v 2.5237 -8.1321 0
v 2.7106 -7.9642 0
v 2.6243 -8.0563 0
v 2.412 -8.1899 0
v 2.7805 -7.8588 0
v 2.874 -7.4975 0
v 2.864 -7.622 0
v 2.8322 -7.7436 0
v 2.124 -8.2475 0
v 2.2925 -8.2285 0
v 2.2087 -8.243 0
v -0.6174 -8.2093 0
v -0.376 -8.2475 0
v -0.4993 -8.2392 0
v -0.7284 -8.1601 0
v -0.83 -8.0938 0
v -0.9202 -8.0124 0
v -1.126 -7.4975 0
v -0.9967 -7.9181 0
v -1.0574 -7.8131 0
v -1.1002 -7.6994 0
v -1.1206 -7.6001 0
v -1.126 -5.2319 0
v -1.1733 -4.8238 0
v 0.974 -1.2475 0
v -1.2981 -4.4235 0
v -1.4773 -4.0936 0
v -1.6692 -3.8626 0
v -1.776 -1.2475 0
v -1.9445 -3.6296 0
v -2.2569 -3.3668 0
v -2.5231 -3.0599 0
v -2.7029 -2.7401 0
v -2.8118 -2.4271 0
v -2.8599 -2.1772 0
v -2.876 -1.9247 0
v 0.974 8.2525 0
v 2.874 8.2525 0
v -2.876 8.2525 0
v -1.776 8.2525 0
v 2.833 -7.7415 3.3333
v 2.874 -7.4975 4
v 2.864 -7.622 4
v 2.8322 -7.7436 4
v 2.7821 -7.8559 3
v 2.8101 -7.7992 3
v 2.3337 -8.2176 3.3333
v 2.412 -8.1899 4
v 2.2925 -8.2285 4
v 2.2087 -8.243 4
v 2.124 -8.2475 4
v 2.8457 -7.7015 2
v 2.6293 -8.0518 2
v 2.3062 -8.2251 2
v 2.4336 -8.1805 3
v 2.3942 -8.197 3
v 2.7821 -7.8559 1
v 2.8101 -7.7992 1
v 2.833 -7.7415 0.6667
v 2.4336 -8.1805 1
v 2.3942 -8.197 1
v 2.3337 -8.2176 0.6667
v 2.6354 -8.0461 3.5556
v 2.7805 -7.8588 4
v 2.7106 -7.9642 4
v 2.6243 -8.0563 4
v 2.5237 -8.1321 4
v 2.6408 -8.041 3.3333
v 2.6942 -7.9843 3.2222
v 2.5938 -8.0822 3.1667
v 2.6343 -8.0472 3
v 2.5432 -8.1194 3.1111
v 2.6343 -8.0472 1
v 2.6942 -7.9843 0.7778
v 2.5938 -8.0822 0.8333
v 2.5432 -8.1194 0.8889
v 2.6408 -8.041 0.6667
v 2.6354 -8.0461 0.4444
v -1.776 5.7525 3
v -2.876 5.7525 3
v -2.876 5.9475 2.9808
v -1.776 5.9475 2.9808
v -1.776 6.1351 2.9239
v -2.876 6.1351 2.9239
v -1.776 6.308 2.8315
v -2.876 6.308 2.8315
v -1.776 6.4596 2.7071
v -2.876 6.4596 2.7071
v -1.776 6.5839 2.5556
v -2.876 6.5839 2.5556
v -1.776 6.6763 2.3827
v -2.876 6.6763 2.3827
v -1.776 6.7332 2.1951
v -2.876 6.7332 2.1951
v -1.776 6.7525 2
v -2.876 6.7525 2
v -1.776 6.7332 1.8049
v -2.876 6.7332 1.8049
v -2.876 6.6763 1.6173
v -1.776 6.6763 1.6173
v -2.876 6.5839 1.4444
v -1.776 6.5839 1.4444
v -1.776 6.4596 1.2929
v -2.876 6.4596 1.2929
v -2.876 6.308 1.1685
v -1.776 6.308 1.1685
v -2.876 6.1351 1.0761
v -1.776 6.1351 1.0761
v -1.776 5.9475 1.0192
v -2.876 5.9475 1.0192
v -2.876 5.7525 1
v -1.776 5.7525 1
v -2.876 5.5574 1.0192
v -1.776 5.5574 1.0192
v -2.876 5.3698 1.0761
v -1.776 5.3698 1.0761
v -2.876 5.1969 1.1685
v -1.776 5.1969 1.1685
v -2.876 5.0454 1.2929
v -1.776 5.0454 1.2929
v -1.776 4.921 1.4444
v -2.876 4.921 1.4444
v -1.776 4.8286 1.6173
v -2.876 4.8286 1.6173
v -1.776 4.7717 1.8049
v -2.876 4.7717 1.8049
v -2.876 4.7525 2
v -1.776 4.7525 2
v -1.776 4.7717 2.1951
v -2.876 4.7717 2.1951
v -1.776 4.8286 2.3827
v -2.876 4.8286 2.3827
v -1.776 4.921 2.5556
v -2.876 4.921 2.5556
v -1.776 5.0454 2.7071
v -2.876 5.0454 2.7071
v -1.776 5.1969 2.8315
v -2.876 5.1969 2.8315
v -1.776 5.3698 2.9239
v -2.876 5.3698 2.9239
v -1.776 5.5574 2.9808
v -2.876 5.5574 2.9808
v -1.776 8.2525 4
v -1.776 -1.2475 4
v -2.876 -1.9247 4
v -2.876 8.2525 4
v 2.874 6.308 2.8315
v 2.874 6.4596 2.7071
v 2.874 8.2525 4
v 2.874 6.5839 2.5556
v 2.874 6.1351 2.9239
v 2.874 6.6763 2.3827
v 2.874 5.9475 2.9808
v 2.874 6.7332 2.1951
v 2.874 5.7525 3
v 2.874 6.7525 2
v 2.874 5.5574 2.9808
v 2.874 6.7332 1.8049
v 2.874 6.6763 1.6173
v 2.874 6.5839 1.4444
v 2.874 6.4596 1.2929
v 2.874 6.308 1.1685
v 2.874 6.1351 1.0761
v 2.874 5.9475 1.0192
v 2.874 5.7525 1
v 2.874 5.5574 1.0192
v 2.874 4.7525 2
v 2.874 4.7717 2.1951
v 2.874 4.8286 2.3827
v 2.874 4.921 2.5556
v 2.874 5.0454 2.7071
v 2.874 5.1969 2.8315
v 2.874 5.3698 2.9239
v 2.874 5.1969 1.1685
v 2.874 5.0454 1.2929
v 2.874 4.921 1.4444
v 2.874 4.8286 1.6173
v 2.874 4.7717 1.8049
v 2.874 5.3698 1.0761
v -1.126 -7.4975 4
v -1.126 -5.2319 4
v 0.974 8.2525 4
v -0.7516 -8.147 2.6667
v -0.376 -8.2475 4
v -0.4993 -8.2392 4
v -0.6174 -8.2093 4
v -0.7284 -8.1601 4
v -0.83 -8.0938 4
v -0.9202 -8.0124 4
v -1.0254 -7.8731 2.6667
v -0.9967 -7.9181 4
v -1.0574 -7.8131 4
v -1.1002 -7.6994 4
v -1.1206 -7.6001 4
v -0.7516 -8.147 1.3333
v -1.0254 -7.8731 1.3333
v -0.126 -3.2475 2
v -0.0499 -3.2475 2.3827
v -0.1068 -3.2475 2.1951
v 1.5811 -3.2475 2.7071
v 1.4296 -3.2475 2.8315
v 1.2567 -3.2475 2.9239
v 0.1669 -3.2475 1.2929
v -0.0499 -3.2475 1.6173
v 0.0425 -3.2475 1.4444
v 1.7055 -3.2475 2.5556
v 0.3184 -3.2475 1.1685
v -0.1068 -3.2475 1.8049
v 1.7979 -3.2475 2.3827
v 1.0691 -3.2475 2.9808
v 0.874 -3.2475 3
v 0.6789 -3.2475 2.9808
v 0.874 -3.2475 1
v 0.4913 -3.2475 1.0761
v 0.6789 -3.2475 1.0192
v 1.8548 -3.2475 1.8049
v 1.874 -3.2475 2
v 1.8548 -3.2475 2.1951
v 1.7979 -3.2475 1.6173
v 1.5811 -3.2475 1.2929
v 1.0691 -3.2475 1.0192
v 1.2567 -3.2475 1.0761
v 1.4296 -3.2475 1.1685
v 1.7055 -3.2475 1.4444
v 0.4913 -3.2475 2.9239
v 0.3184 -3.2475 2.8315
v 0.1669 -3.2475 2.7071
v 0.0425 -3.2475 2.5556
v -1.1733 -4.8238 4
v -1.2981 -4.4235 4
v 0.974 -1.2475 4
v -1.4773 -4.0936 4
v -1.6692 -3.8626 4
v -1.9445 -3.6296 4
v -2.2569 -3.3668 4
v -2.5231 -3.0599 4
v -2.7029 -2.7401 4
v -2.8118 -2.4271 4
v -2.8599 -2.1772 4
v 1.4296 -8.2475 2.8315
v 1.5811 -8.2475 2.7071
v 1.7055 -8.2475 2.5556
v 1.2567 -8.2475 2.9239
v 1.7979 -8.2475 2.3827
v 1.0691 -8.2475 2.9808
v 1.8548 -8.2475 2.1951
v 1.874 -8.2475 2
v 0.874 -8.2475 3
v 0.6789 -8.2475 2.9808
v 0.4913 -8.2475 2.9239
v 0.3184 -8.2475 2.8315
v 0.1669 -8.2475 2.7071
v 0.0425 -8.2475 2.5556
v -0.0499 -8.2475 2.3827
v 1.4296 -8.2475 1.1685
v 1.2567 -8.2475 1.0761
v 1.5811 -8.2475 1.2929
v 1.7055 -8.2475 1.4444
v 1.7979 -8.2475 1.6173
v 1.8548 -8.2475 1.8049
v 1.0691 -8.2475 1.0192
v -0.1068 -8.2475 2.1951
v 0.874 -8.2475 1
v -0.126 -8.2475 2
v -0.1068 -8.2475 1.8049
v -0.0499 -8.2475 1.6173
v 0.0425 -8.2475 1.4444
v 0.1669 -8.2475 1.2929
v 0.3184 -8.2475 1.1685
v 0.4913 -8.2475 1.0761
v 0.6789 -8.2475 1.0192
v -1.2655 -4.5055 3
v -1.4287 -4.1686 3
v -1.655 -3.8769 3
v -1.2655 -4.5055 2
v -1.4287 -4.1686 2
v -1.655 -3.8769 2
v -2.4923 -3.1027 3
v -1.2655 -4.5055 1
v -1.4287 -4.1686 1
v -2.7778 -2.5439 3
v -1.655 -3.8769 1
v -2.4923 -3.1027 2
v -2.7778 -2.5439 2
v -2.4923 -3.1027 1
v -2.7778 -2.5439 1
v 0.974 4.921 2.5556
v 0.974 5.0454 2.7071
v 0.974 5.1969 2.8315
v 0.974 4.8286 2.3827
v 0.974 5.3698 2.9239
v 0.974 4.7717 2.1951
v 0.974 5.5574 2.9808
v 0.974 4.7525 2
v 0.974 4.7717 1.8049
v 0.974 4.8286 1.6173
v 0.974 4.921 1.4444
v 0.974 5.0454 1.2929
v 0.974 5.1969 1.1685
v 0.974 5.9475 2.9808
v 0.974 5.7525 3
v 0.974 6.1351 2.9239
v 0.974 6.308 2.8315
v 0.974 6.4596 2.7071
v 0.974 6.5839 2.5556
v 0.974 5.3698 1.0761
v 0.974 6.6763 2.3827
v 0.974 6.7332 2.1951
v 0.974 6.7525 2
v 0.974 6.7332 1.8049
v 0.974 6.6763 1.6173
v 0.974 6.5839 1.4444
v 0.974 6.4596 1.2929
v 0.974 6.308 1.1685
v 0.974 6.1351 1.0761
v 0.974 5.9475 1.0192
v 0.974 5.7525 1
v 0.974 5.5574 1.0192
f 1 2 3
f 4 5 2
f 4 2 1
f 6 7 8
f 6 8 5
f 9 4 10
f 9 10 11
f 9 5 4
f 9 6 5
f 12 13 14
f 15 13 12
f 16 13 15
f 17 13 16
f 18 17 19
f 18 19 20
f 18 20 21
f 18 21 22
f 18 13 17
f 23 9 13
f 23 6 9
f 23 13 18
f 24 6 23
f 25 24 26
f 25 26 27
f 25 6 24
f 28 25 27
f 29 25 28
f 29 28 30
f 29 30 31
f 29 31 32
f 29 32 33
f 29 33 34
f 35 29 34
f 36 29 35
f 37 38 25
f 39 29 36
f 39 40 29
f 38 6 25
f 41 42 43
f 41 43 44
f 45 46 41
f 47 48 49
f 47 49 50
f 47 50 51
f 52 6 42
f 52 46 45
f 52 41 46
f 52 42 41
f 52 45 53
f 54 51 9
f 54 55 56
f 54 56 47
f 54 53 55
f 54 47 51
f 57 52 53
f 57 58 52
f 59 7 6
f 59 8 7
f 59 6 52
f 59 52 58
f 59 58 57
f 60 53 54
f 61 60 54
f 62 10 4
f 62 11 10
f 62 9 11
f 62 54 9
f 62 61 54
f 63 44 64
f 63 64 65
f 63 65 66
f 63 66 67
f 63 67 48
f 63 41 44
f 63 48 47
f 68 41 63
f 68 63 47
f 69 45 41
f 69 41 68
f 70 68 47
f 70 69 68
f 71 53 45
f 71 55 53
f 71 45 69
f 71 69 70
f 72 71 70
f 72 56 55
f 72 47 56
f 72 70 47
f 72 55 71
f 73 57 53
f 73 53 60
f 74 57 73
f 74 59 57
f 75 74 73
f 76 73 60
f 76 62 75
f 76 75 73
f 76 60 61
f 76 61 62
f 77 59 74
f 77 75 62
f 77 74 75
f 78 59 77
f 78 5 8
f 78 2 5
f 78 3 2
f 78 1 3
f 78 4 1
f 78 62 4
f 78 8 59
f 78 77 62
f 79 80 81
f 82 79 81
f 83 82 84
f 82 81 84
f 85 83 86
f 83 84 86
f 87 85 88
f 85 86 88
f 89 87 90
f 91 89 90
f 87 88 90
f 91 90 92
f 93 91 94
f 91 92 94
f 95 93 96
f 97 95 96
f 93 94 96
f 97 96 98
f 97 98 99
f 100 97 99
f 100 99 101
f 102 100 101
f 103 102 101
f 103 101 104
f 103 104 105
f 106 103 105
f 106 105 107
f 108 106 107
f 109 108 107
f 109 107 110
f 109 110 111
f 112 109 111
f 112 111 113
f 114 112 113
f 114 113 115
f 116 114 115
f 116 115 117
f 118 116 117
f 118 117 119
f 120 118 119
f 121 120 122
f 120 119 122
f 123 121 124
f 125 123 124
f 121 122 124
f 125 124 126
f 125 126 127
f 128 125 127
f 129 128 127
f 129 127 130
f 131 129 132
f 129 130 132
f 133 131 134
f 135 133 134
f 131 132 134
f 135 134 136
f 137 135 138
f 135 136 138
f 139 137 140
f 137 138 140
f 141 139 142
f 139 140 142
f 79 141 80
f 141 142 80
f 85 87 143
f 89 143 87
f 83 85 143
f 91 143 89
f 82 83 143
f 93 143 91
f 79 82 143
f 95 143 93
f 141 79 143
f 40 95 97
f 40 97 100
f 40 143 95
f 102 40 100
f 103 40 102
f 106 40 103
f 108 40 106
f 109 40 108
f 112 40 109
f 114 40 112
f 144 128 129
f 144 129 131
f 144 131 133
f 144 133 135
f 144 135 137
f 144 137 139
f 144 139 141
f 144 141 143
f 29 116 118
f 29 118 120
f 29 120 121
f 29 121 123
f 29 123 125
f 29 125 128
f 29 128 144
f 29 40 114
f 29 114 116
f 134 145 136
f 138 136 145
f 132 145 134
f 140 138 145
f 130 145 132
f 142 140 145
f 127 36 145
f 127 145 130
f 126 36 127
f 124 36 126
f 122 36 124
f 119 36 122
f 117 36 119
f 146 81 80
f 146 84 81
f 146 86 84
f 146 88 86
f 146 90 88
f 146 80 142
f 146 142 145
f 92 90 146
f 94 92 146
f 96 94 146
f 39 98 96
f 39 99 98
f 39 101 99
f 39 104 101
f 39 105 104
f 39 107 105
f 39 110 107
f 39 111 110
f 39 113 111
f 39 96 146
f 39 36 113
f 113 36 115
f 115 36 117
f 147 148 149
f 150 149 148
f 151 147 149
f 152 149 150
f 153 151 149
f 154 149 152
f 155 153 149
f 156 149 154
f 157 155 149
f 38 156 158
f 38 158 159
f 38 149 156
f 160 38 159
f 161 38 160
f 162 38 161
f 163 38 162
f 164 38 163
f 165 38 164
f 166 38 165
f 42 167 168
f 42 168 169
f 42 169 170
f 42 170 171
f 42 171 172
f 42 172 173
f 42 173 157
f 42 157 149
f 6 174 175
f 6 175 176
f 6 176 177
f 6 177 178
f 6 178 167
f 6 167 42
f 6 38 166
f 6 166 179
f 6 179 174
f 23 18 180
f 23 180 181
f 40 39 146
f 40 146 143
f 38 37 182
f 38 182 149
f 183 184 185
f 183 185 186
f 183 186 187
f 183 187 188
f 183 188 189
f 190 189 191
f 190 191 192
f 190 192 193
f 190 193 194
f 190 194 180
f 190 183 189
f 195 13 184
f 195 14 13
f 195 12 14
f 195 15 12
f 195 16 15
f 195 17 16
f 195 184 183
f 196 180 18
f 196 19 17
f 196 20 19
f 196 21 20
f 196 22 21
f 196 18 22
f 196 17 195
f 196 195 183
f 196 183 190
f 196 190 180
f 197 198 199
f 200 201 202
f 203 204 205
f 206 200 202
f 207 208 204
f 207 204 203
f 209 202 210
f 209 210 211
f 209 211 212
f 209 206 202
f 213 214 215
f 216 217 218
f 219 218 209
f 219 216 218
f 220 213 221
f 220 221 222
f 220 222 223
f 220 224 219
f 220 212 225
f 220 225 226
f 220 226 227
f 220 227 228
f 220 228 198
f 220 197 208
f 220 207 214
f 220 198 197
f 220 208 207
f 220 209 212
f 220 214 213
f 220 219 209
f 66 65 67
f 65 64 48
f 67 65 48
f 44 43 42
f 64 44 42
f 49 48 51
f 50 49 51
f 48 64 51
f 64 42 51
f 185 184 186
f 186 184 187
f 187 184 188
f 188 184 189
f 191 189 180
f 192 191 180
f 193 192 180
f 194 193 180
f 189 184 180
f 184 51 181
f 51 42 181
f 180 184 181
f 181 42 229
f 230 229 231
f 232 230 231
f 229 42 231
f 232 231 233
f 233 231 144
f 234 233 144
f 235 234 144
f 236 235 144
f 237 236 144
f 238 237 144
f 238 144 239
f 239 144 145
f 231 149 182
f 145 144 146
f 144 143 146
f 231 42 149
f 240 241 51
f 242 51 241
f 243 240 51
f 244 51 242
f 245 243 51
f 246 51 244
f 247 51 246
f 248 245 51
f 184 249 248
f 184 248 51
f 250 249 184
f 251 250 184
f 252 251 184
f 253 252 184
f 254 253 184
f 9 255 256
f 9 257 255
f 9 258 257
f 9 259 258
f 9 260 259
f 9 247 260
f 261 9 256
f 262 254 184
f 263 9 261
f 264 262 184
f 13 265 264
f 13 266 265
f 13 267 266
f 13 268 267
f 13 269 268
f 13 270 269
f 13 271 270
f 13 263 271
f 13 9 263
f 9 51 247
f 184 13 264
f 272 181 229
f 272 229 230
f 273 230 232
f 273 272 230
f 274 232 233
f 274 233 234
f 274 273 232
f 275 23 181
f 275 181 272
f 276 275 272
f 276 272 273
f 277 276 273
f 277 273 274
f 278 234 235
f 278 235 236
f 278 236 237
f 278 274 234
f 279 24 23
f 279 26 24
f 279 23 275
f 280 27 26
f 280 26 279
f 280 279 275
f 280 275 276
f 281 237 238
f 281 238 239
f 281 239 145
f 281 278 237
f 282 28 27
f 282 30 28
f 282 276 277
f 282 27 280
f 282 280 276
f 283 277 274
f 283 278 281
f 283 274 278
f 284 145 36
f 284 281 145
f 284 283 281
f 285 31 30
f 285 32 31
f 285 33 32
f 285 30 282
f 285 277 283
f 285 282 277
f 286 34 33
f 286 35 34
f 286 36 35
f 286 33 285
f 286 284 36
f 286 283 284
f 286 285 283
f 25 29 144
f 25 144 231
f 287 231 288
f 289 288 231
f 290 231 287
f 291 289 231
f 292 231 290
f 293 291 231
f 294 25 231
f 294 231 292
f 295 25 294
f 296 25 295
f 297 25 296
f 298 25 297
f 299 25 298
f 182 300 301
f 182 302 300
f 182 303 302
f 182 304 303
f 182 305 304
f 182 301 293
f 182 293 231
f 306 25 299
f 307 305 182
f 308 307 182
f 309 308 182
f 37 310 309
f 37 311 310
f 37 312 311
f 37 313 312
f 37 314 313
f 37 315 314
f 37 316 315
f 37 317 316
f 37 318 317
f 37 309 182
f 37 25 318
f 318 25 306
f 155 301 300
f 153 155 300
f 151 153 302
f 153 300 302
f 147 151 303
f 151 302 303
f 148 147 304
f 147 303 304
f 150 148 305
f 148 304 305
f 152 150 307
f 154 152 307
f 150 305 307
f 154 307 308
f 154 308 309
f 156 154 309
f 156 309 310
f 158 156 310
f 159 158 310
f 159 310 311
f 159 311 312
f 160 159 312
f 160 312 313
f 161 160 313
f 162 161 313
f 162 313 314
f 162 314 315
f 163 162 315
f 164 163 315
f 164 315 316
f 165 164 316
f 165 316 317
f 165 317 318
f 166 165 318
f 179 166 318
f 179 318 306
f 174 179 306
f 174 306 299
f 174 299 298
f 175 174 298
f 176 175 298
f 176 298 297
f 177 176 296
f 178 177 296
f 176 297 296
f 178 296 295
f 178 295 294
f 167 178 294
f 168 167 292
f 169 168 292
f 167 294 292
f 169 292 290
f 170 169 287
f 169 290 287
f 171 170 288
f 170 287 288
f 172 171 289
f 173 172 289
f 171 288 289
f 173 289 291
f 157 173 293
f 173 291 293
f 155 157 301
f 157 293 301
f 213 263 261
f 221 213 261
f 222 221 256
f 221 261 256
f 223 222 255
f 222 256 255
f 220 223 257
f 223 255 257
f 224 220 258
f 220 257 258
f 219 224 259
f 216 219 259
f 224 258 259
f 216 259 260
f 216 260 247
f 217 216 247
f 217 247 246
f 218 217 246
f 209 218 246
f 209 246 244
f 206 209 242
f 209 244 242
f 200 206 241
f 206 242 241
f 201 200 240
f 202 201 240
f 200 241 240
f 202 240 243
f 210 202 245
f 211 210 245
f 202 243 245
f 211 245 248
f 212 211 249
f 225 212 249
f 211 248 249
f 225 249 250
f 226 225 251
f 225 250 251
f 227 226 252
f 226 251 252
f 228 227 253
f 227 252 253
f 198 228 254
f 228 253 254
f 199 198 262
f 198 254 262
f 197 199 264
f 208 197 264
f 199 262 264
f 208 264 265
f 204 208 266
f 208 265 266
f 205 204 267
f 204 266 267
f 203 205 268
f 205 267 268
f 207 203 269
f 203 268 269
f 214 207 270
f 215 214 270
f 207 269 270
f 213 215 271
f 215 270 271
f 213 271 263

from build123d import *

# Parameters (mm, degrees)
EXTRUDE_1_DEPTH     = 4
SKETCH_2_R          = 1
CUT_EXTRUDE_1_DEPTH = 10
SKETCH_3_R          = 1
CUT_EXTRUDE_2_DEPTH = 5


with BuildPart() as part:
    # 草图1 → 凸台-拉伸1 (new body)
    with BuildSketch(Plane.XY):
        with BuildLine():
            Line((2.873991467, 8.252459404), (2.873991467, -7.497540596))
            add(Edge.make_bspline(
                [(2.873991467, -7.497540596), (2.876380091, -7.703382966), (2.699447856, -8.096674523), (2.307764461, -8.248651724), (2.123991437, -8.247540596)],
                knots=[0, 0, 0, 0, 0.528701234, 1, 1, 1, 1], degree=3))
            Line((2.123991437, -8.247540596), (-0.376008504, -8.247540596))
            add(Edge.make_bspline(
                [(-0.376008504, -8.247540596), (-0.778705468, -8.257378213), (-1.13584565, -7.900237207), (-1.126008504, -7.497540596)],
                knots=[0, 0, 0, 0, 1, 1, 1, 1], degree=3))
            Line((-1.126008504, -7.497540596), (-1.126008504, -5.231853607))
            add(Edge.make_bspline(
                [(-1.126008504, -5.231853607), (-1.13659163, -4.751735199), (-1.378371208, -4.02376985), (-2.103997508, -3.523981437), (-2.680544309, -2.960520138), (-2.876380091, -2.341140701), (-2.876008504, -1.924665096)],
                knots=[0, 0, 0, 0, 0.381620227, 0.529034697, 0.676294459, 1, 1, 1, 1], degree=3))
            Line((-2.876008504, -1.924665096), (-2.876008504, 8.252459404))
            Line((-2.876008504, 8.252459404), (-1.776008599, 8.252459404))
            Line((-1.776008599, 8.252459404), (-1.776008599, -1.247540596))
            Line((-1.776008599, -1.247540596), (0.973991401, -1.247540596))
            Line((0.973991401, -1.247540596), (0.973991401, 8.252459404))
            Line((0.973991401, 8.252459404), (2.873991467, 8.252459404))
        make_face()
    extrude(amount=EXTRUDE_1_DEPTH)

    # 草图2 → 切除-拉伸1 (cut)
    with BuildSketch(Plane.ZY.offset(2.876008504)):
        with Locations((2, 5.752459404)):
            Circle(SKETCH_2_R)
    extrude(amount=-CUT_EXTRUDE_1_DEPTH, mode=Mode.SUBTRACT)

    # 草图3 → 切除-拉伸2 (cut)
    with BuildSketch(Plane.XZ.offset(8.247540596)):
        with Locations(Location((0.873991437, 2, 0), (0, 0, 270))):
            Circle(SKETCH_3_R)
    extrude(amount=-CUT_EXTRUDE_2_DEPTH, mode=Mode.SUBTRACT)


solid = part.part
